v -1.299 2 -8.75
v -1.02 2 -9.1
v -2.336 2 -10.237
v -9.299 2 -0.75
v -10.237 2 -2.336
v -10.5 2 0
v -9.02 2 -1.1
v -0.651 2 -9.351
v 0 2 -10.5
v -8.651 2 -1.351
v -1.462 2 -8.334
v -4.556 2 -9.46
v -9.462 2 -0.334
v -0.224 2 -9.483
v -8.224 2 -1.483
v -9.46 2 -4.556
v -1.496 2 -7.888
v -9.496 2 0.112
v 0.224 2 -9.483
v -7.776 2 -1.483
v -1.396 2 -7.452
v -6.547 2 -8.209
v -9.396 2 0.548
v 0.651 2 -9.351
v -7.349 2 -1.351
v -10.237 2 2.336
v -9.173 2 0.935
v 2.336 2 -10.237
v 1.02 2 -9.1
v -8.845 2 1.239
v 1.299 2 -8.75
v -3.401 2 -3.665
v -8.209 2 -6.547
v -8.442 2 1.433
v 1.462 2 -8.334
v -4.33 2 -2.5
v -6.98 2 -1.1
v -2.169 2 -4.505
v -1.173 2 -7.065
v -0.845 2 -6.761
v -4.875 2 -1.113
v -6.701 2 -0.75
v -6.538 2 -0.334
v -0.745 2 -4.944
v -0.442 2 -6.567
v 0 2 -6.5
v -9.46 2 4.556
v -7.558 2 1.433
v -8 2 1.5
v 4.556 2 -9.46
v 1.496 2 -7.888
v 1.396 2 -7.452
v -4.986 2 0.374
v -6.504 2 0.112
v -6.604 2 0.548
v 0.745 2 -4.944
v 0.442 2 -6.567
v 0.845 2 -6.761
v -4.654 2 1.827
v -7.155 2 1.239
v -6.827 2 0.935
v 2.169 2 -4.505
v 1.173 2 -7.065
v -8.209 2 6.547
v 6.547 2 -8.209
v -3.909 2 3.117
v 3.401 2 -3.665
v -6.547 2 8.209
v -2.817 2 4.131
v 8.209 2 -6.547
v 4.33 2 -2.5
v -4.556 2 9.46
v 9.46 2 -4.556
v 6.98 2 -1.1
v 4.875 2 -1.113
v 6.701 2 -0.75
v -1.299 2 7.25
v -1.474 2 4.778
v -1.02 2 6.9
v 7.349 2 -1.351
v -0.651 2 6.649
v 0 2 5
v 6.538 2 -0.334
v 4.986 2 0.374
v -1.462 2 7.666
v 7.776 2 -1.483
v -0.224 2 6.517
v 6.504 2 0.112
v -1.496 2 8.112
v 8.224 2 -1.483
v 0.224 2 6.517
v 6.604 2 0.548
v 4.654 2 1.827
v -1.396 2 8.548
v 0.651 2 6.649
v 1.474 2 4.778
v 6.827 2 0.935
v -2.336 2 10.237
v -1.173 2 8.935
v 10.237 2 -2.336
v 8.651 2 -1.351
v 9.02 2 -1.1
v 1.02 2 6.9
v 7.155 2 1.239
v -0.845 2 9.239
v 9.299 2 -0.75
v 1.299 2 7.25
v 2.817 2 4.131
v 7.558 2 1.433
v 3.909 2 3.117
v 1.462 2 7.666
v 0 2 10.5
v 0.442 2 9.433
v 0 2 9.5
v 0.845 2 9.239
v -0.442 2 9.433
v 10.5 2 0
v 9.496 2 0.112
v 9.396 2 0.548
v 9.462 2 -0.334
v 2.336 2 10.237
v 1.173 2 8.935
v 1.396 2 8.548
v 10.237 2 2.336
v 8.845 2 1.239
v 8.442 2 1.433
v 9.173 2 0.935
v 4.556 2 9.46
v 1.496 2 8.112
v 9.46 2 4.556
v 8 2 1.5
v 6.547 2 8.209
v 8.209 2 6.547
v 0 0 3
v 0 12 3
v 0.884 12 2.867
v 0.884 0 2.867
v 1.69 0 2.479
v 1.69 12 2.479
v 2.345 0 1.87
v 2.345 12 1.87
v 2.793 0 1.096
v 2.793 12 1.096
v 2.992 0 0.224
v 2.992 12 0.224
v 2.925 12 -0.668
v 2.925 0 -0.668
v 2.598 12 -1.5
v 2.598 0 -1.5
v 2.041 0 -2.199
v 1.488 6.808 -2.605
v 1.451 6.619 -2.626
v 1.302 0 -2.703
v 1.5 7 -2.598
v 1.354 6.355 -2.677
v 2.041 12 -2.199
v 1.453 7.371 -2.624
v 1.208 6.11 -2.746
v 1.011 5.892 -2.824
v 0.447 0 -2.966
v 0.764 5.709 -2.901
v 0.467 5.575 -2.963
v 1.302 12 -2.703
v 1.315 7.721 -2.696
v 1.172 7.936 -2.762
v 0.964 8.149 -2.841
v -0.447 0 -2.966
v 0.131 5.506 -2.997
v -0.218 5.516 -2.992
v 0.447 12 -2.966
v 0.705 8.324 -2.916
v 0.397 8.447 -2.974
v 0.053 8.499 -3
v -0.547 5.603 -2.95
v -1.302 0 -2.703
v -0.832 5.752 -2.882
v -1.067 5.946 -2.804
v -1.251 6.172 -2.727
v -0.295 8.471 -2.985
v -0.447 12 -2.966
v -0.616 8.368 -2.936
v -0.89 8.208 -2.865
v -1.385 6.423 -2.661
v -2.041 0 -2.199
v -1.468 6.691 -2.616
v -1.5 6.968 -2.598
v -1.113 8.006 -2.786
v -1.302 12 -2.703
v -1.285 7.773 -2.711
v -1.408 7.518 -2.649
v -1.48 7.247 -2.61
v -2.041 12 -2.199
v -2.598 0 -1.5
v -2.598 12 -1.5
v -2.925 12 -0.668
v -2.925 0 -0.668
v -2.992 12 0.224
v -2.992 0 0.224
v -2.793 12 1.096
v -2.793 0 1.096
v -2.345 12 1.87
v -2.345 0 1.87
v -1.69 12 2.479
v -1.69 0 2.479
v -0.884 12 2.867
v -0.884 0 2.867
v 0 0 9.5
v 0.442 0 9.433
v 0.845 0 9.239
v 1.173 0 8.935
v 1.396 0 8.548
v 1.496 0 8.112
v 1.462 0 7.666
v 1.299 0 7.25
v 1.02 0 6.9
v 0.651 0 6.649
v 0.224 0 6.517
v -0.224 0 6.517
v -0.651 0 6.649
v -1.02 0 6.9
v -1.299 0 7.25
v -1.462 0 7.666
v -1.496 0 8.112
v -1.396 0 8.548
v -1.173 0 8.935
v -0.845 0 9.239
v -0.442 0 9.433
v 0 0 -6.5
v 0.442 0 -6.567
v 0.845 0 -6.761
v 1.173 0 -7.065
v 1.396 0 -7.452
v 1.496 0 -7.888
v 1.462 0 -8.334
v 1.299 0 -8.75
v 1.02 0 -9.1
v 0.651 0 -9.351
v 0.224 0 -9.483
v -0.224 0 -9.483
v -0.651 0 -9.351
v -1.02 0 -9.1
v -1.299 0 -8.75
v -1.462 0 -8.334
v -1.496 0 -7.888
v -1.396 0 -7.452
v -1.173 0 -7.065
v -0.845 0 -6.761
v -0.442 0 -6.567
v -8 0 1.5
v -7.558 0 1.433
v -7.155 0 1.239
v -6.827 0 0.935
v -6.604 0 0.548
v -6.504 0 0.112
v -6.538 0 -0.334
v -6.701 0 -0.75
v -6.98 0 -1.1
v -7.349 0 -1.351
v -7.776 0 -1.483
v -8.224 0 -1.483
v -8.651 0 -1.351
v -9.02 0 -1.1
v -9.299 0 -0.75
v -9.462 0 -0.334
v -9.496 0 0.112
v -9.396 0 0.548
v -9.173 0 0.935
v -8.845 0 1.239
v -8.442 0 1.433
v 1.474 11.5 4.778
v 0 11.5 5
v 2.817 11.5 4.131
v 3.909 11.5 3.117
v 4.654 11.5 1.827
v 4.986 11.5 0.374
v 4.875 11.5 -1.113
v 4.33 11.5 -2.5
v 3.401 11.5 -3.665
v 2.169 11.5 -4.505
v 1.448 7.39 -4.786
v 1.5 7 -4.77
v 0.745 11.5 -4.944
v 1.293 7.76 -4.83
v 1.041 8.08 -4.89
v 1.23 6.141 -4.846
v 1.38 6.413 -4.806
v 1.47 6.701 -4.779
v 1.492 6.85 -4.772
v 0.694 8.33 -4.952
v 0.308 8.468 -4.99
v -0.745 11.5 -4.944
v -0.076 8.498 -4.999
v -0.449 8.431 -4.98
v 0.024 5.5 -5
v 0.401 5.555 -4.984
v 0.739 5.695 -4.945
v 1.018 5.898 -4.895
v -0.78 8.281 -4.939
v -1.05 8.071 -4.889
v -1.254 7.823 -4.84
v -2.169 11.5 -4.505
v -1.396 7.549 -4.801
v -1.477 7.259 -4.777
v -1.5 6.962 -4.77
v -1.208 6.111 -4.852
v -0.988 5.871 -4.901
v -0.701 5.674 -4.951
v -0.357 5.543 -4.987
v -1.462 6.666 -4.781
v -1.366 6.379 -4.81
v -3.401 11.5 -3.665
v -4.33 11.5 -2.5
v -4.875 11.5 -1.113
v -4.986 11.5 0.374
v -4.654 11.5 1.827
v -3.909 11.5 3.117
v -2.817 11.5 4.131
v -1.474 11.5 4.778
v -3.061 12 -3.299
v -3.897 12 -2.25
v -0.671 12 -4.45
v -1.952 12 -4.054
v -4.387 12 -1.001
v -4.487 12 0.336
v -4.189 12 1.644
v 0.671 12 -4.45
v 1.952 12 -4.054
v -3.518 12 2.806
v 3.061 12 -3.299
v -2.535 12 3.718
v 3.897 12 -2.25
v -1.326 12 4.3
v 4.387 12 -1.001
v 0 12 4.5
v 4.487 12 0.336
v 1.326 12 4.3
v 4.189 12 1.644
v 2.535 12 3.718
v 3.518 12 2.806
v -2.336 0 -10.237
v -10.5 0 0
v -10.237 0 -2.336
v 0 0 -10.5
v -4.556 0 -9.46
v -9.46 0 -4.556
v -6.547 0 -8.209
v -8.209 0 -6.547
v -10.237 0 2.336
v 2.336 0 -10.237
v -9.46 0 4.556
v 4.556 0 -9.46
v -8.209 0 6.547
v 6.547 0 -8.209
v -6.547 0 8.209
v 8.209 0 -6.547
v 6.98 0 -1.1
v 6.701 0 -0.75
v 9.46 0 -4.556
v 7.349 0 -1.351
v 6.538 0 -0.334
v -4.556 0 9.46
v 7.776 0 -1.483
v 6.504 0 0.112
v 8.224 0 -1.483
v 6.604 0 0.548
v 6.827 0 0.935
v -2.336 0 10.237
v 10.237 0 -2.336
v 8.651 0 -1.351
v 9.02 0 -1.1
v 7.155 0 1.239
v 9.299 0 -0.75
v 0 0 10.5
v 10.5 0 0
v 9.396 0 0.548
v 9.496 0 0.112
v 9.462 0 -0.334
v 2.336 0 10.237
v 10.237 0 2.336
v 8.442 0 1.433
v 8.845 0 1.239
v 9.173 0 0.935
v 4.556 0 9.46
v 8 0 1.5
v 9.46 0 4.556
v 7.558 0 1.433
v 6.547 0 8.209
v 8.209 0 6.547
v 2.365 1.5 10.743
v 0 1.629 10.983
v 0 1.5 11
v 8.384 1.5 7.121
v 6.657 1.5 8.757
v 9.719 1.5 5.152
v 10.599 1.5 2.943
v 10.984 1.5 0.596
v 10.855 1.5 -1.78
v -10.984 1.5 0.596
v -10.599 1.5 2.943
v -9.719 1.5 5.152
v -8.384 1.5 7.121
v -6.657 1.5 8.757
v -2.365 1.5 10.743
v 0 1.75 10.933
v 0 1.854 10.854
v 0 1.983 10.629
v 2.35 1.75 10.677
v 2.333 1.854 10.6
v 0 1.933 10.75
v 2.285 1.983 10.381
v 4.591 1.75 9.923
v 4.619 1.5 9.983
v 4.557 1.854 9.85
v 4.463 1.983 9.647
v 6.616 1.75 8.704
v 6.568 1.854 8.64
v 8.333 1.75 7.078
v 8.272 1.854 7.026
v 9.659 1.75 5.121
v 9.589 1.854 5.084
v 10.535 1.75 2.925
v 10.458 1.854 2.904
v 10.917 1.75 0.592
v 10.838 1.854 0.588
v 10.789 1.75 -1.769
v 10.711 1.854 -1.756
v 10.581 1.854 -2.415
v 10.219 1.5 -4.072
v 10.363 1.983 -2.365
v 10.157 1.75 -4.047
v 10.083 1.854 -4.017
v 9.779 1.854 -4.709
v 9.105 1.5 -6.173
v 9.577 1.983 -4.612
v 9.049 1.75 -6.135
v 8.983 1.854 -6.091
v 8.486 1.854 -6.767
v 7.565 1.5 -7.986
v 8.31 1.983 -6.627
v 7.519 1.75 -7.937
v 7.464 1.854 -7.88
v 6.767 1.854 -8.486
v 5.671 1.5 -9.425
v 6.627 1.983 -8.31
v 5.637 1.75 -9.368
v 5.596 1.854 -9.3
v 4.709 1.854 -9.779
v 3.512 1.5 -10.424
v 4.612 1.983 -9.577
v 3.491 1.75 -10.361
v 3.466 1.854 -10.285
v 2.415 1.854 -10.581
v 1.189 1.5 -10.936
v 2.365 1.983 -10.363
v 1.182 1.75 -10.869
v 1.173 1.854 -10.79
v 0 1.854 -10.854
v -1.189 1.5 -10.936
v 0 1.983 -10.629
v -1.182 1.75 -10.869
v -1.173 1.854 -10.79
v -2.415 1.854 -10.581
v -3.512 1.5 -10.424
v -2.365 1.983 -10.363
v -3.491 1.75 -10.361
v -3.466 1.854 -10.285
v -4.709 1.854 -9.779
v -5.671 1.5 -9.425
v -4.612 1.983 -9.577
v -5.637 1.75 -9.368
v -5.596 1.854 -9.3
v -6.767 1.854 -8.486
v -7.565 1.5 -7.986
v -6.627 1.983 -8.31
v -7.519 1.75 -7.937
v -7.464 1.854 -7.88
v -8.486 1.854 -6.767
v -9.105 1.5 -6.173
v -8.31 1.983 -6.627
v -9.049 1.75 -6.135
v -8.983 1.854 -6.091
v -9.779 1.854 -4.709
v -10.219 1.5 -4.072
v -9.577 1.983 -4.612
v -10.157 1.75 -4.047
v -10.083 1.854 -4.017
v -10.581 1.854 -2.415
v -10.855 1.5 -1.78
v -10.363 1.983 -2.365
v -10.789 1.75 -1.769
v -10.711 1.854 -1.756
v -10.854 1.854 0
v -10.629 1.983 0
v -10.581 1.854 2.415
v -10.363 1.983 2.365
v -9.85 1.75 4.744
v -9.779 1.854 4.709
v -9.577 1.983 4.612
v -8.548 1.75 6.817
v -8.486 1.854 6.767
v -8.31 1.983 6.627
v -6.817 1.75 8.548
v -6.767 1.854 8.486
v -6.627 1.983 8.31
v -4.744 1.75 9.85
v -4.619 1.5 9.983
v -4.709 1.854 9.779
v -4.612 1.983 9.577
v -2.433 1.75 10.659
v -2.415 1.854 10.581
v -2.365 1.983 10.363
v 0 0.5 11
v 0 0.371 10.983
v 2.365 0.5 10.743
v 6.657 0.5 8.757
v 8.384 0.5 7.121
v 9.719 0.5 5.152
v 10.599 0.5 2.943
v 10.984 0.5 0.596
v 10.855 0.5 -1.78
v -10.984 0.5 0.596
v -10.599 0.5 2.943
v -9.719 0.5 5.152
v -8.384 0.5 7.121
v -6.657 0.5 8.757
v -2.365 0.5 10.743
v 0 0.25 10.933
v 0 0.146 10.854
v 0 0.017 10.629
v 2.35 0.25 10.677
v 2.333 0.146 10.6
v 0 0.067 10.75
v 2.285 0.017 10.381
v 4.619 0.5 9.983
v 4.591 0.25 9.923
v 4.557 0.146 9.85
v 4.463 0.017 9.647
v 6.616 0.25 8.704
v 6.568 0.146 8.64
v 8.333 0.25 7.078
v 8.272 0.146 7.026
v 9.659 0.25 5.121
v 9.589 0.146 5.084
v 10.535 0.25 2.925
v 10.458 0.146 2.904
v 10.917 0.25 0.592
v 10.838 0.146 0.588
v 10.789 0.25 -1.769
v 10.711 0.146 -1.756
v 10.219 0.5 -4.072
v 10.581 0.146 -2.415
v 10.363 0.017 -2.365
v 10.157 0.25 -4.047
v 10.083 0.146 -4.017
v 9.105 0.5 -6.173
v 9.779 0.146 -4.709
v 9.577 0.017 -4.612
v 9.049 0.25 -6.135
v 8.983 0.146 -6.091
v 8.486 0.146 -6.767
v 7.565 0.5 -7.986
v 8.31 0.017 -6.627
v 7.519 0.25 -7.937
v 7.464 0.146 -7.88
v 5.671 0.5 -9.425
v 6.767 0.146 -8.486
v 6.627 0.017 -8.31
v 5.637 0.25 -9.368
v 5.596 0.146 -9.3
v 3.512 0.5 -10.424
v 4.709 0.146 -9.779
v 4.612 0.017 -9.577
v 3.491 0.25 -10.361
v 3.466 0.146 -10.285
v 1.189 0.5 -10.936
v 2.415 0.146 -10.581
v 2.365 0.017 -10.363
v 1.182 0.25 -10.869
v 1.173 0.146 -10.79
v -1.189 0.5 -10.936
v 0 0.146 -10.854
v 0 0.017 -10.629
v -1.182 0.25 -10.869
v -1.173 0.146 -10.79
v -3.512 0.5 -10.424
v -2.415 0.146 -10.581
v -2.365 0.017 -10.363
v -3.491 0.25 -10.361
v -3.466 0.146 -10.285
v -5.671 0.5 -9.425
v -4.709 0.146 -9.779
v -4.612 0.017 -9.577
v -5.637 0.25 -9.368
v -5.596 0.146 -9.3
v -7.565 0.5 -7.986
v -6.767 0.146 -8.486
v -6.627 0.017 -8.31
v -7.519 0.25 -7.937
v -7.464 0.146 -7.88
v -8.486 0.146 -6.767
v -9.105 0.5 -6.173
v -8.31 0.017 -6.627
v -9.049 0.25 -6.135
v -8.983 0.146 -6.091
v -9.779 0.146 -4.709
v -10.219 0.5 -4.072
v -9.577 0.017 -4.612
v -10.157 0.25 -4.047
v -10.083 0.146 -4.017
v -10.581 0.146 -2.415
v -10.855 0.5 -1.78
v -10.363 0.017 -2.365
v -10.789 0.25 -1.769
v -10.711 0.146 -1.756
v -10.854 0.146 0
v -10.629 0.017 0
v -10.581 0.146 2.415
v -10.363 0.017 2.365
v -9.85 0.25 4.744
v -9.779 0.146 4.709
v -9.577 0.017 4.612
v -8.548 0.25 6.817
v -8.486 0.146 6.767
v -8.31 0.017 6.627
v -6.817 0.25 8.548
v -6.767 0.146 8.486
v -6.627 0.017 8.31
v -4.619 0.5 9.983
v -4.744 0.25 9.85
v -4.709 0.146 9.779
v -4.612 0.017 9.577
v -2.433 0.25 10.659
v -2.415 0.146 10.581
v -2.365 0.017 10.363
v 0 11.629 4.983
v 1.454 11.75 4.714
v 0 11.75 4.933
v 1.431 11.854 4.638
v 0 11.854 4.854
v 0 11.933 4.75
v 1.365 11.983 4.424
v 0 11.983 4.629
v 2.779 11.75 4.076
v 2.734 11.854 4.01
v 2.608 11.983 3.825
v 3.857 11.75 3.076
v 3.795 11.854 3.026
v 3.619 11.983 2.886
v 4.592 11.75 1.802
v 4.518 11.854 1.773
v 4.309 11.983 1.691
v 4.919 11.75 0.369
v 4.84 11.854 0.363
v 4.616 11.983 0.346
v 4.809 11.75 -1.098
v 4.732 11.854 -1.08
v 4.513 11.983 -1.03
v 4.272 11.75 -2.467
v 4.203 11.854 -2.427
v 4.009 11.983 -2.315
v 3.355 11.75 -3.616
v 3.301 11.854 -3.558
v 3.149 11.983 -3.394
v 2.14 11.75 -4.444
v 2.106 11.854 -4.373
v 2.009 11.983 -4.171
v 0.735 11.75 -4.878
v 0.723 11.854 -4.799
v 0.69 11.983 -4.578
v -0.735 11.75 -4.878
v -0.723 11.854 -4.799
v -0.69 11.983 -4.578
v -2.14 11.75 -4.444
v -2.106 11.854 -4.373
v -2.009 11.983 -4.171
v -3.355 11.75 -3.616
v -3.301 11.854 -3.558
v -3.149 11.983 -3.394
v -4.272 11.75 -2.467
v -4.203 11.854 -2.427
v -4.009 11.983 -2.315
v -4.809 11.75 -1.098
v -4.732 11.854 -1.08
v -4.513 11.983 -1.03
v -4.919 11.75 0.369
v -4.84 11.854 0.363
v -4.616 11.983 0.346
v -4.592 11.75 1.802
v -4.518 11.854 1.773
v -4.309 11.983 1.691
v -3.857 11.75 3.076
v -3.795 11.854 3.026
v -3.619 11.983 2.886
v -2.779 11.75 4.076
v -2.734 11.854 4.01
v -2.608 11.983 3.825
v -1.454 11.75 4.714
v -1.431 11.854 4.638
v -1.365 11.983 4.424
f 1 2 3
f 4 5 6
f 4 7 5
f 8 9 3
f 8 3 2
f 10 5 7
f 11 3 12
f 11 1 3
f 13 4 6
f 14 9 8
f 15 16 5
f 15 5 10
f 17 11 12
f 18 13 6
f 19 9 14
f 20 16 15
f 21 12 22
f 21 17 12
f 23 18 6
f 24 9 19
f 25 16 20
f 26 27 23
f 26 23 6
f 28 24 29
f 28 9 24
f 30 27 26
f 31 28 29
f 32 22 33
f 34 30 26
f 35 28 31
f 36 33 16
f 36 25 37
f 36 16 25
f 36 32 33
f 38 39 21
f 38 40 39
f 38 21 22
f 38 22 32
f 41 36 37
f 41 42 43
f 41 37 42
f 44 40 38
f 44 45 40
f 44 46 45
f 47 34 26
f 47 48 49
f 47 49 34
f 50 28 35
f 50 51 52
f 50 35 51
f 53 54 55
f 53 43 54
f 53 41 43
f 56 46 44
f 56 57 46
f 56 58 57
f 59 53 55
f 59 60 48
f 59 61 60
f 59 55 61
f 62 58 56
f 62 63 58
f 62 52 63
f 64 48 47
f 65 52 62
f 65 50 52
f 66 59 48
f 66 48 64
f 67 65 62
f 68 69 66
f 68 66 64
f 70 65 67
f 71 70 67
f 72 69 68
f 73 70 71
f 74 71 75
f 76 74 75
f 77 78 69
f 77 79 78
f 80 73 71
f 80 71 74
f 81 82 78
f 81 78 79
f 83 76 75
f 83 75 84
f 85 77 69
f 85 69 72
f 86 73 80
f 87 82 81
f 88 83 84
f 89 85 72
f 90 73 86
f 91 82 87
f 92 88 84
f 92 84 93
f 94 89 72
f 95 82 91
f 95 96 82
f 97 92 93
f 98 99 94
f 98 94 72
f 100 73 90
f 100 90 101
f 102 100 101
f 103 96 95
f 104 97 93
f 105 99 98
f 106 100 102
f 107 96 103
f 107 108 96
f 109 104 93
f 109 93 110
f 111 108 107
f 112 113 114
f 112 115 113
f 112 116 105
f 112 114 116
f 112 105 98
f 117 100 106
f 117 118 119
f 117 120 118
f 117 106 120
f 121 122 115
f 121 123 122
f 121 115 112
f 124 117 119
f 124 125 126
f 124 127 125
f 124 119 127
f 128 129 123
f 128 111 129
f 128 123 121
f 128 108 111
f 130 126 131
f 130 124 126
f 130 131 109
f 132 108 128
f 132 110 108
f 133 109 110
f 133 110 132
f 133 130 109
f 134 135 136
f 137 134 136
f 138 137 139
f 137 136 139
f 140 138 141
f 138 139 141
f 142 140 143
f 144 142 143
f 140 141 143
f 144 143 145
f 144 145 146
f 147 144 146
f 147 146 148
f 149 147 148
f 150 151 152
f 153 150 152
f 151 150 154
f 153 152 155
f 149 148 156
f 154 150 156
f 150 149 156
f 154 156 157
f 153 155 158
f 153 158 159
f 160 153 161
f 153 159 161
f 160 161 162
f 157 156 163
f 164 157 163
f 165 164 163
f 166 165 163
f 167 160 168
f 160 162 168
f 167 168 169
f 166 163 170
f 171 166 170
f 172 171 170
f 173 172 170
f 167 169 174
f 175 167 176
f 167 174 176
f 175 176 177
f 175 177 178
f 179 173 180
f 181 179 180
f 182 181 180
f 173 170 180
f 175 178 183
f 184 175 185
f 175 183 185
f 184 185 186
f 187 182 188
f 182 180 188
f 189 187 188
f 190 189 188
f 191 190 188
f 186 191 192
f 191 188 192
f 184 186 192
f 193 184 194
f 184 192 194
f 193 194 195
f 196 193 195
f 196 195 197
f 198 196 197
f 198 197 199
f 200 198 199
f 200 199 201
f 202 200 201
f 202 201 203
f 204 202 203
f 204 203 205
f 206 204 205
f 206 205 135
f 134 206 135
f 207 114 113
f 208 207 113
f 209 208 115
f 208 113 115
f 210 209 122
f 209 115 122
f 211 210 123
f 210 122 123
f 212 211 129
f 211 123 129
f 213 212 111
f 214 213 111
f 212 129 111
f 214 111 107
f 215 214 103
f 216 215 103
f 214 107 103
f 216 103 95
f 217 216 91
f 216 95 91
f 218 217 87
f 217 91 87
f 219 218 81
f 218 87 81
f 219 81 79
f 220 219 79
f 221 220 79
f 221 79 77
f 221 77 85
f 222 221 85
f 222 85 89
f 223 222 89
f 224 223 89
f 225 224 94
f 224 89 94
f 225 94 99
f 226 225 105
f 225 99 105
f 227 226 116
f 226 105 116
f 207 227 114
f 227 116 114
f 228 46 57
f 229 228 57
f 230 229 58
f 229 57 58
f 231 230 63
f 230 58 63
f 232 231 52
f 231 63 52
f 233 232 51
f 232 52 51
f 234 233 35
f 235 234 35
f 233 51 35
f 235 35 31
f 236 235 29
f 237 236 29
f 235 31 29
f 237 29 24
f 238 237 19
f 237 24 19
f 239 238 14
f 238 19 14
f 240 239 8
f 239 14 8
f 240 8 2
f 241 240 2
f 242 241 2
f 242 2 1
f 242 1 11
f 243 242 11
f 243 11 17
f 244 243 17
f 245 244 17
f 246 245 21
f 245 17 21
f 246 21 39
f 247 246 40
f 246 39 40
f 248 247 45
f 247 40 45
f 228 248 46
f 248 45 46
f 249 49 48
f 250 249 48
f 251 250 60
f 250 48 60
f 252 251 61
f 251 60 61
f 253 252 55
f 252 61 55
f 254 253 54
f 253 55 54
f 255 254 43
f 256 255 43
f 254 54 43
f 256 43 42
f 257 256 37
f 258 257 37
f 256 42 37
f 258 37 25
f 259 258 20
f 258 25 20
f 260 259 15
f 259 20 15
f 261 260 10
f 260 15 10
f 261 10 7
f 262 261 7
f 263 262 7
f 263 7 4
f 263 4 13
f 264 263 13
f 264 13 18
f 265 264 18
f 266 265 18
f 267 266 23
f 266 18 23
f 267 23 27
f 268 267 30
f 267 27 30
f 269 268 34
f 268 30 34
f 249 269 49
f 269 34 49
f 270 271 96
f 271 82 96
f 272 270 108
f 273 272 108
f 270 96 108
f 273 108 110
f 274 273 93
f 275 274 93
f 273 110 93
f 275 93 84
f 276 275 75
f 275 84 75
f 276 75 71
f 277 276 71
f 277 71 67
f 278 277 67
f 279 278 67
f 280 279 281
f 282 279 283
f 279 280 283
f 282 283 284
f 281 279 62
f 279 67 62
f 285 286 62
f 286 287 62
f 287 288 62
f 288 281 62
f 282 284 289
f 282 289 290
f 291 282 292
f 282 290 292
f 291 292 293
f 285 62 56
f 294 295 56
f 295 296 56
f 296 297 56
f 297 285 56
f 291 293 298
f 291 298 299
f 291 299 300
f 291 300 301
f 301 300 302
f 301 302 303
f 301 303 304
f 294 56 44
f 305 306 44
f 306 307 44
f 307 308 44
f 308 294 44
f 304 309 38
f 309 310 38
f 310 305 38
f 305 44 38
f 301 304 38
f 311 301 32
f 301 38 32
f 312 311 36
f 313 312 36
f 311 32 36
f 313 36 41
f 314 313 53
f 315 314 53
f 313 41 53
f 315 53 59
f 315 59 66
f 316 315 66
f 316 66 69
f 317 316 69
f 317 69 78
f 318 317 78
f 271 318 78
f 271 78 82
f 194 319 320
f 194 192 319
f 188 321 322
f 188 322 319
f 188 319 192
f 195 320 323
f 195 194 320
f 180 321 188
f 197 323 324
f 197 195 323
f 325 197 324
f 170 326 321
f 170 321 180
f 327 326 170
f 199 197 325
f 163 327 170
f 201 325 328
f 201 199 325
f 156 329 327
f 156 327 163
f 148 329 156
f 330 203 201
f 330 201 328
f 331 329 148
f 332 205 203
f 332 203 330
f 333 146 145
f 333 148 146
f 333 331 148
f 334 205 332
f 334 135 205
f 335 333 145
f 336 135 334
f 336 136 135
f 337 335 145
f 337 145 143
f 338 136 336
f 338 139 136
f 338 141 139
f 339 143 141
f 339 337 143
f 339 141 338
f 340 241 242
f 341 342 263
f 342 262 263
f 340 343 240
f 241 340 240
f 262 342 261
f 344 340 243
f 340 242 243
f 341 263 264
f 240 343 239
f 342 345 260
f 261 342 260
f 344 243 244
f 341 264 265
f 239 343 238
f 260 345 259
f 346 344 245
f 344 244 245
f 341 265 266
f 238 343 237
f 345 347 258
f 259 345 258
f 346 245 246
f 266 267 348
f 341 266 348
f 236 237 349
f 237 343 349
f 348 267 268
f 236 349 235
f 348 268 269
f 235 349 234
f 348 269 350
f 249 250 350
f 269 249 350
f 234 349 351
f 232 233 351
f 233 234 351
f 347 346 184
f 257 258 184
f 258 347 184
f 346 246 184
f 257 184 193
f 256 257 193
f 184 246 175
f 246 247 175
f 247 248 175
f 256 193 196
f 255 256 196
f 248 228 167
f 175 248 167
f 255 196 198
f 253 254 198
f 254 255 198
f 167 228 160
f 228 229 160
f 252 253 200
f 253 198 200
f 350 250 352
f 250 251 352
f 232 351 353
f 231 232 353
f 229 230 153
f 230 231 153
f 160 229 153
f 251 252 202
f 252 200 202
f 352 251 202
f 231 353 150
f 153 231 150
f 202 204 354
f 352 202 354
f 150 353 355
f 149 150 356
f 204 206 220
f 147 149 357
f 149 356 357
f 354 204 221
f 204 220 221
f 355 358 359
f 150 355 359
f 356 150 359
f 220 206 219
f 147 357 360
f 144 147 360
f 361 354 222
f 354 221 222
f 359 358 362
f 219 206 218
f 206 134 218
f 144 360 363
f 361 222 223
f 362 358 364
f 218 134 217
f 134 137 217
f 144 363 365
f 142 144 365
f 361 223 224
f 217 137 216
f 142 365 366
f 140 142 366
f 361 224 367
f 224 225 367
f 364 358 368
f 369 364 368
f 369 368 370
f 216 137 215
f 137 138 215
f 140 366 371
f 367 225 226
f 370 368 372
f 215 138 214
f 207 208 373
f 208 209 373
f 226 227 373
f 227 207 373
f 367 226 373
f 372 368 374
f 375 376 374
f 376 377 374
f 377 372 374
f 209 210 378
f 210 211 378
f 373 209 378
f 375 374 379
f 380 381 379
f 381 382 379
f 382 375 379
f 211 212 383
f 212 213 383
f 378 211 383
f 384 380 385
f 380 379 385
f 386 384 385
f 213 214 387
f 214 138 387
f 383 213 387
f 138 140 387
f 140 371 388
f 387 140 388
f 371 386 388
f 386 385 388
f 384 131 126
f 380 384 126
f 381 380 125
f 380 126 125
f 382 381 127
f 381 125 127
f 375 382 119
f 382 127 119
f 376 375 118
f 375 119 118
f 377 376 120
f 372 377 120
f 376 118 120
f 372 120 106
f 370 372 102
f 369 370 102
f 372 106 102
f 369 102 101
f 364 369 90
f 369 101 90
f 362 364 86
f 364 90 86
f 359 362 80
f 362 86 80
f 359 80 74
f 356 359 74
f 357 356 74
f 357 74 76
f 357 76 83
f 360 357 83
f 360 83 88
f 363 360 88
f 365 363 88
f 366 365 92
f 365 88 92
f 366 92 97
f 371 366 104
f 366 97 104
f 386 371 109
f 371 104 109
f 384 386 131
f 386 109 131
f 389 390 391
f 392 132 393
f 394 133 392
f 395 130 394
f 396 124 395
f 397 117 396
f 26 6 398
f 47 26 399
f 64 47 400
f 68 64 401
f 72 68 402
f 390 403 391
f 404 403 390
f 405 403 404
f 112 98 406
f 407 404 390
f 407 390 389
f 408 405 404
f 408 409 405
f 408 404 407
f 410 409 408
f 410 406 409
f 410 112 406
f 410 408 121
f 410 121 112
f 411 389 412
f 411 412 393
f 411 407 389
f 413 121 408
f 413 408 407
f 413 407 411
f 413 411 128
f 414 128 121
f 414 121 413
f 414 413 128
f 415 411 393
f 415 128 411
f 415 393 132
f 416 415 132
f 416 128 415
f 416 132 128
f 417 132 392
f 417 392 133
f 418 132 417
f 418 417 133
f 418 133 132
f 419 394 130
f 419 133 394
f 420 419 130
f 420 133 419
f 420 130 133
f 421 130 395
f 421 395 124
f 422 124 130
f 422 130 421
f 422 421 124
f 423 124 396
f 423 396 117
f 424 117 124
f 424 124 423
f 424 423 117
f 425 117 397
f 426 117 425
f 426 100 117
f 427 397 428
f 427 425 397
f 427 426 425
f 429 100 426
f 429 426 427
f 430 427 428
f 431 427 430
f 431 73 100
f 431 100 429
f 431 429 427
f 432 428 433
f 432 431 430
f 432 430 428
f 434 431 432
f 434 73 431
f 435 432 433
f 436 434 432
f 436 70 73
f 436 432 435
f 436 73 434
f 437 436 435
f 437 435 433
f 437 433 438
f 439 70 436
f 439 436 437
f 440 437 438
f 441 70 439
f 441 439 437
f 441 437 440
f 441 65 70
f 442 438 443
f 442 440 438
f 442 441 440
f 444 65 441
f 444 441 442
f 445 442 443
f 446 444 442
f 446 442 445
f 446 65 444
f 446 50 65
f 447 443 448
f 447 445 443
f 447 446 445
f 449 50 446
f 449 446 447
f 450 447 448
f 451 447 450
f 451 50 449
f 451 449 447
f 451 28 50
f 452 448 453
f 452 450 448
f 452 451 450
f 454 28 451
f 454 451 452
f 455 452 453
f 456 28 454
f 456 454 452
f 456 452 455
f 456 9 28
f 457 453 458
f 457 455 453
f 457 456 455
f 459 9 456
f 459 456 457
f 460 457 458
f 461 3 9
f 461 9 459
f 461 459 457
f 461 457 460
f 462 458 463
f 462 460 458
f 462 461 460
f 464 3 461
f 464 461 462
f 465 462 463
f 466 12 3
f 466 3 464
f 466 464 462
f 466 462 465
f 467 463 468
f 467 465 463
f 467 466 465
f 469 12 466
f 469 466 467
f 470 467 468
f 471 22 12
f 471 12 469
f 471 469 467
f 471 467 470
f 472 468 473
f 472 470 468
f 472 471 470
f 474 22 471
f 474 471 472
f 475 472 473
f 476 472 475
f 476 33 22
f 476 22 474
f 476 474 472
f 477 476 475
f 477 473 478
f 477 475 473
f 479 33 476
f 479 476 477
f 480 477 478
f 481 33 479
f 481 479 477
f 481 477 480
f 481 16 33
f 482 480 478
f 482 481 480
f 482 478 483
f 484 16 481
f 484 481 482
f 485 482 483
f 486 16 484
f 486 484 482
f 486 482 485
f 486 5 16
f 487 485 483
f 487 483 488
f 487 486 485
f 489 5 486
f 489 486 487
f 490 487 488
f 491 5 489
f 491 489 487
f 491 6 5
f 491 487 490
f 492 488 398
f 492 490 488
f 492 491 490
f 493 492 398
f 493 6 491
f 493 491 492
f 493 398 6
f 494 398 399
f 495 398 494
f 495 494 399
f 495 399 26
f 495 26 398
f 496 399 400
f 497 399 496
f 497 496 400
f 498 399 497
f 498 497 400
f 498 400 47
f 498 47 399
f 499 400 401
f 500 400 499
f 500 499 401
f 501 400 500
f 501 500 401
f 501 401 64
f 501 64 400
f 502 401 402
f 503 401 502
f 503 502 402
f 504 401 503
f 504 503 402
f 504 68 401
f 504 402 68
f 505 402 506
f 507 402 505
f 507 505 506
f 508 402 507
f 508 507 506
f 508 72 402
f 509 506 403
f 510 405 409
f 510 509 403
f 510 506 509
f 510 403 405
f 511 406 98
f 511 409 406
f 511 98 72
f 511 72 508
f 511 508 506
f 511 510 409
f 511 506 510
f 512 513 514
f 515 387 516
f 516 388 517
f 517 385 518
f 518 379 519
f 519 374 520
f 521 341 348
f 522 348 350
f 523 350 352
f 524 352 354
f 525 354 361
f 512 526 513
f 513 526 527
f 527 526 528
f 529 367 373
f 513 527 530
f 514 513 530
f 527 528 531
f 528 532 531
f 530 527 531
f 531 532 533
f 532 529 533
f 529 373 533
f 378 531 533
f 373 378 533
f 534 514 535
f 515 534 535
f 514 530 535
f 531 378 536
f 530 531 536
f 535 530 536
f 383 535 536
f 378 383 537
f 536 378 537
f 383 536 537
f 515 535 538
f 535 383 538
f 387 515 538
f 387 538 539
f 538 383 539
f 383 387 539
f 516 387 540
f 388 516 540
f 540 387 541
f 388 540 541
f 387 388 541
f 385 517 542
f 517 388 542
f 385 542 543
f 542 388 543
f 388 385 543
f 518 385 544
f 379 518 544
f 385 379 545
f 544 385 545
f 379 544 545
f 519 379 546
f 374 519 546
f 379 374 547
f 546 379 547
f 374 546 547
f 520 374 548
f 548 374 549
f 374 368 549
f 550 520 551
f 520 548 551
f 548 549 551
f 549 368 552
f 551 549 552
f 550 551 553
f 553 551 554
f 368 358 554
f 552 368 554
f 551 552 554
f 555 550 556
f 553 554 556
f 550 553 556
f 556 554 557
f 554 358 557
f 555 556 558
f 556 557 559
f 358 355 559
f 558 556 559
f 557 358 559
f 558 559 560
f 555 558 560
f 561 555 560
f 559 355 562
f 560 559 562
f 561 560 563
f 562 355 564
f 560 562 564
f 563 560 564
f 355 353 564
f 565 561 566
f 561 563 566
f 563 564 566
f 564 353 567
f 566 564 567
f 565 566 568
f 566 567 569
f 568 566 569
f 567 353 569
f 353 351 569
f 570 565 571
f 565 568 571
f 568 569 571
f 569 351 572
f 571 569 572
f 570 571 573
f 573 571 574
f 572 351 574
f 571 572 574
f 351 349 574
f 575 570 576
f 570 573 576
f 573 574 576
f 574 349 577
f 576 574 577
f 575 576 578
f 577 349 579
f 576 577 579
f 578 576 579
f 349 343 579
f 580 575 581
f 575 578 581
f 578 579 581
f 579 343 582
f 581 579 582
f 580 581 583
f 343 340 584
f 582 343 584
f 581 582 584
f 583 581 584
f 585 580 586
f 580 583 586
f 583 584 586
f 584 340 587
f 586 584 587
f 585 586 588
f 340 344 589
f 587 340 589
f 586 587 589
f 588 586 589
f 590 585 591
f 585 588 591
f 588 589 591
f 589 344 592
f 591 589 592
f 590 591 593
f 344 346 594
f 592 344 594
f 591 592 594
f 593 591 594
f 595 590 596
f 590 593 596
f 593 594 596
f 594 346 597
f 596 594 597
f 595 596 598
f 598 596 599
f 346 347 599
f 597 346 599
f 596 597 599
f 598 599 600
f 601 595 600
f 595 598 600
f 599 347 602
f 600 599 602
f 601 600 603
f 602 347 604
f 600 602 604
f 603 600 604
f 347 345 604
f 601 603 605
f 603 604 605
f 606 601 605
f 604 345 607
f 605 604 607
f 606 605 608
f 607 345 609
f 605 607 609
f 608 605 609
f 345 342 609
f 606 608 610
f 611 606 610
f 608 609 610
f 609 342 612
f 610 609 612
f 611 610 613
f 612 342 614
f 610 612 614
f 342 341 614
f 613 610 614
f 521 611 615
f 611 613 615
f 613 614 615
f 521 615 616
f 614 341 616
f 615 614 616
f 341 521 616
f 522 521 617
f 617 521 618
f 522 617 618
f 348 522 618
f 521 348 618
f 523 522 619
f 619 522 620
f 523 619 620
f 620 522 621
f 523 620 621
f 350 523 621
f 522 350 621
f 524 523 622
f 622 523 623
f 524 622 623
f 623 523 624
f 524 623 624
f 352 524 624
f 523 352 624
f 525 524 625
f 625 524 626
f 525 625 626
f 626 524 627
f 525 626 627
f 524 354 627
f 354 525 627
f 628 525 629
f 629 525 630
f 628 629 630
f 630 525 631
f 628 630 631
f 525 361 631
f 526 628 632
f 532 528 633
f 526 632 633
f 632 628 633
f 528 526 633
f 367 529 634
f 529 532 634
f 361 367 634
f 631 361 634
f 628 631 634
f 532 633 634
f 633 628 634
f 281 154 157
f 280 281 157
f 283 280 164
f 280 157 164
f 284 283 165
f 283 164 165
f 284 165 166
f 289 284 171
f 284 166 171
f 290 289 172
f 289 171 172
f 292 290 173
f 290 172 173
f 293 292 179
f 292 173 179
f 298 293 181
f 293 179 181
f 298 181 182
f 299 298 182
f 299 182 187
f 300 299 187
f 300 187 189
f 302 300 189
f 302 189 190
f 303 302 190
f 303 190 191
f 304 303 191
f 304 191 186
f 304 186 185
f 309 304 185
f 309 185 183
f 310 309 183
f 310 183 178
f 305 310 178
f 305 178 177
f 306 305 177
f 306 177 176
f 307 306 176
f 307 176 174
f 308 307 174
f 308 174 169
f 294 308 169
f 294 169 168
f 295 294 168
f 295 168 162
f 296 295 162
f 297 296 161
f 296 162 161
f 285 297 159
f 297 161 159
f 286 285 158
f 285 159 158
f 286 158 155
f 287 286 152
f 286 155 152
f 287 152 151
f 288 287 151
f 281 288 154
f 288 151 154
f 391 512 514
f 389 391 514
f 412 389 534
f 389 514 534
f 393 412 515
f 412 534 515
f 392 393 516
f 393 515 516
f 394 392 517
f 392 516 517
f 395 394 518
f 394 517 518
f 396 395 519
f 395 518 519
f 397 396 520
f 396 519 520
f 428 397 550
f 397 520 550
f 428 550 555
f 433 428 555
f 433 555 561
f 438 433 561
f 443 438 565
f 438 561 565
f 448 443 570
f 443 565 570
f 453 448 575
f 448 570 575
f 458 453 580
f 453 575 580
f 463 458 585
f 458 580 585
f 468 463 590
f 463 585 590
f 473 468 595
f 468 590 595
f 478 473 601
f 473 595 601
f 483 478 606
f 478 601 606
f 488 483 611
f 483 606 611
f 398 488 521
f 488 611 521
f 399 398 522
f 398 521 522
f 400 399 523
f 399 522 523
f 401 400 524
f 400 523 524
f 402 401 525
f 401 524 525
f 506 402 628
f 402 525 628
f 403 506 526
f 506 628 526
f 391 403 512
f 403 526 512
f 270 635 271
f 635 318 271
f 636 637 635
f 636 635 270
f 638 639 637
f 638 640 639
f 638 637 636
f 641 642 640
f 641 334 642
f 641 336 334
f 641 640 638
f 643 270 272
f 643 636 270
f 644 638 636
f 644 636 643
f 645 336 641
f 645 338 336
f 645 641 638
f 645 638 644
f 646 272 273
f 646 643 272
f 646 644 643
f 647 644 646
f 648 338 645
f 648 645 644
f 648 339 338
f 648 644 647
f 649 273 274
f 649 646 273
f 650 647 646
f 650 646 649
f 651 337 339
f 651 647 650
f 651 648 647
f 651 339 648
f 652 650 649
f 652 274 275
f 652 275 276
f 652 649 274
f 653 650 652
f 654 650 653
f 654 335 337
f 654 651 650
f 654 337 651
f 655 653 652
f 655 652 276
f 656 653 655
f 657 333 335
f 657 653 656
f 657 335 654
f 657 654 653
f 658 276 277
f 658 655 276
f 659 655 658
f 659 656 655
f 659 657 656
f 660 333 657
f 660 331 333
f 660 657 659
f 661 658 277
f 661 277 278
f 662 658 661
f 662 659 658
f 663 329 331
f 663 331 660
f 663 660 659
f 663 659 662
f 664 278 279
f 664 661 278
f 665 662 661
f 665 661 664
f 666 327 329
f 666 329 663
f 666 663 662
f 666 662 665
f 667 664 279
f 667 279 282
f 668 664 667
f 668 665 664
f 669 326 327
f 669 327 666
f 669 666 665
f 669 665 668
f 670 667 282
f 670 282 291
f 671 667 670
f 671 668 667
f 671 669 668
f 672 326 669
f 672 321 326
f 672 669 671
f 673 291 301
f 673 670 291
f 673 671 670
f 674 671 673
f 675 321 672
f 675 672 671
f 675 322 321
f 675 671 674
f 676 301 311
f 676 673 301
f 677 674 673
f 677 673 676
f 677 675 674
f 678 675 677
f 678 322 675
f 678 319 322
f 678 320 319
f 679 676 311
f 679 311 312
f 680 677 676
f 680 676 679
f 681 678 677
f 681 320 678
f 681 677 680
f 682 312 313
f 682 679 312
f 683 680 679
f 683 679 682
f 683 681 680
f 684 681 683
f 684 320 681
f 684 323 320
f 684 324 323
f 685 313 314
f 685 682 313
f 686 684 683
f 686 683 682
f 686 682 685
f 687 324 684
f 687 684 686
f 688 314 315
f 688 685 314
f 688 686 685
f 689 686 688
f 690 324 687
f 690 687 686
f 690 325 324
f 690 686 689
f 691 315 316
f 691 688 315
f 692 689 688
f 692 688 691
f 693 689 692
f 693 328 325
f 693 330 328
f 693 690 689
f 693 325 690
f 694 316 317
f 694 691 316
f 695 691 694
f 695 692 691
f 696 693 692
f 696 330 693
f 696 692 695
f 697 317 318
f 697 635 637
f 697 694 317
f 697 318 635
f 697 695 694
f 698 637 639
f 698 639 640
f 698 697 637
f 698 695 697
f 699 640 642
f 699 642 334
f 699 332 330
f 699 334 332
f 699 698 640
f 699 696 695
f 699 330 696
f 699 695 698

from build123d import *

# Parameters (mm, degrees)
SKETCH_1_R               = 11
EXTRUDE_1_DEPTH          = 2
SKETCH_2_R               = 1.5
CUT_EXTRUDE_1_DEPTH      = 2
SKETCH_3_R               = 5
EXTRUDE_2_DEPTH          = 10
SKETCH_4_R               = 3
CUT_EXTRUDE_2_DEPTH      = 12
FILLET_1_R               = 0.5
CUT_EXTRUDE_3_REACH      = 21.647
CUT_EXTRUDE_3_END_RADIUS = 5
SKETCH_5_R               = 1.5


with BuildPart() as part:
    # 草图1 → 凸台-拉伸1 (new body)
    with BuildSketch(Plane(origin=(0, 0, 0), x_dir=(1, 0, 0), z_dir=(0, 1, 0))):
        with Locations(Location((0, 0, 0), (0, 0, 270))):
            Circle(SKETCH_1_R)
    extrude(amount=EXTRUDE_1_DEPTH)

    # 草图2 → 切除-拉伸1 (cut)
    with BuildSketch(Plane(origin=(0, 2, 0), x_dir=(1, 0, 0), z_dir=(0, 1, 0))):
        with Locations(Location((0, 8, 0), (0, 0, 270))):
            Circle(SKETCH_2_R)
        with Locations(Location((8, 0, 0), (0, 0, 270))):
            Circle(SKETCH_2_R)
        with Locations(Location((0, -8, 0), (0, 0, 270))):
            Circle(SKETCH_2_R)
        with Locations(Location((-8, 0, 0), (0, 0, 270))):
            Circle(SKETCH_2_R)
    extrude(amount=-CUT_EXTRUDE_1_DEPTH, mode=Mode.SUBTRACT)

    # 草图3 → 凸台-拉伸2 (add)
    with BuildSketch(Plane(origin=(0, 2, 0), x_dir=(1, 0, 0), z_dir=(0, 1, 0))):
        with Locations(Location((0, 0, 0), (0, 0, 270))):
            Circle(SKETCH_3_R)
    extrude(amount=EXTRUDE_2_DEPTH)

    # 草图4 → 切除-拉伸2 (cut)
    with BuildSketch(Plane(origin=(0, 12, 0), x_dir=(1, 0, 0), z_dir=(0, 1, 0))):
        with Locations(Location((0, 0, 0), (0, 0, 270))):
            Circle(SKETCH_4_R)
    extrude(amount=-CUT_EXTRUDE_2_DEPTH, mode=Mode.SUBTRACT)

    # 圆角1
    fillet_1_edges = [part.edges().sort_by_distance(p)[0] for p in [
        (0, 0, -11),
        (0, 12, -5),
        (0, 2, -11),
    ]]
    fillet(fillet_1_edges, radius=FILLET_1_R)

    # 切除-拉伸3: up to this cylinder (the profile starts inside it)
    cut_extrude_3_end = Plane(origin=(0, 7, 0), z_dir=(0, -1, 0)) * Cylinder(CUT_EXTRUDE_3_END_RADIUS, 54.294, mode=Mode.PRIVATE)
    # 草图5 → 切除-拉伸3 (cut, up to the surface)
    with BuildSketch(Plane.XY, mode=Mode.PRIVATE) as cut_extrude_3_sk1:
        with Locations((0, 7)):
            Circle(SKETCH_5_R)
    cut_extrude_3_tool1 = extrude(cut_extrude_3_sk1.sketch, amount=-CUT_EXTRUDE_3_REACH, mode=Mode.PRIVATE) & cut_extrude_3_end
    add(cut_extrude_3_tool1.solids().sort_by_distance((0, 7, 0))[0], mode=Mode.SUBTRACT)


solid = part.part
